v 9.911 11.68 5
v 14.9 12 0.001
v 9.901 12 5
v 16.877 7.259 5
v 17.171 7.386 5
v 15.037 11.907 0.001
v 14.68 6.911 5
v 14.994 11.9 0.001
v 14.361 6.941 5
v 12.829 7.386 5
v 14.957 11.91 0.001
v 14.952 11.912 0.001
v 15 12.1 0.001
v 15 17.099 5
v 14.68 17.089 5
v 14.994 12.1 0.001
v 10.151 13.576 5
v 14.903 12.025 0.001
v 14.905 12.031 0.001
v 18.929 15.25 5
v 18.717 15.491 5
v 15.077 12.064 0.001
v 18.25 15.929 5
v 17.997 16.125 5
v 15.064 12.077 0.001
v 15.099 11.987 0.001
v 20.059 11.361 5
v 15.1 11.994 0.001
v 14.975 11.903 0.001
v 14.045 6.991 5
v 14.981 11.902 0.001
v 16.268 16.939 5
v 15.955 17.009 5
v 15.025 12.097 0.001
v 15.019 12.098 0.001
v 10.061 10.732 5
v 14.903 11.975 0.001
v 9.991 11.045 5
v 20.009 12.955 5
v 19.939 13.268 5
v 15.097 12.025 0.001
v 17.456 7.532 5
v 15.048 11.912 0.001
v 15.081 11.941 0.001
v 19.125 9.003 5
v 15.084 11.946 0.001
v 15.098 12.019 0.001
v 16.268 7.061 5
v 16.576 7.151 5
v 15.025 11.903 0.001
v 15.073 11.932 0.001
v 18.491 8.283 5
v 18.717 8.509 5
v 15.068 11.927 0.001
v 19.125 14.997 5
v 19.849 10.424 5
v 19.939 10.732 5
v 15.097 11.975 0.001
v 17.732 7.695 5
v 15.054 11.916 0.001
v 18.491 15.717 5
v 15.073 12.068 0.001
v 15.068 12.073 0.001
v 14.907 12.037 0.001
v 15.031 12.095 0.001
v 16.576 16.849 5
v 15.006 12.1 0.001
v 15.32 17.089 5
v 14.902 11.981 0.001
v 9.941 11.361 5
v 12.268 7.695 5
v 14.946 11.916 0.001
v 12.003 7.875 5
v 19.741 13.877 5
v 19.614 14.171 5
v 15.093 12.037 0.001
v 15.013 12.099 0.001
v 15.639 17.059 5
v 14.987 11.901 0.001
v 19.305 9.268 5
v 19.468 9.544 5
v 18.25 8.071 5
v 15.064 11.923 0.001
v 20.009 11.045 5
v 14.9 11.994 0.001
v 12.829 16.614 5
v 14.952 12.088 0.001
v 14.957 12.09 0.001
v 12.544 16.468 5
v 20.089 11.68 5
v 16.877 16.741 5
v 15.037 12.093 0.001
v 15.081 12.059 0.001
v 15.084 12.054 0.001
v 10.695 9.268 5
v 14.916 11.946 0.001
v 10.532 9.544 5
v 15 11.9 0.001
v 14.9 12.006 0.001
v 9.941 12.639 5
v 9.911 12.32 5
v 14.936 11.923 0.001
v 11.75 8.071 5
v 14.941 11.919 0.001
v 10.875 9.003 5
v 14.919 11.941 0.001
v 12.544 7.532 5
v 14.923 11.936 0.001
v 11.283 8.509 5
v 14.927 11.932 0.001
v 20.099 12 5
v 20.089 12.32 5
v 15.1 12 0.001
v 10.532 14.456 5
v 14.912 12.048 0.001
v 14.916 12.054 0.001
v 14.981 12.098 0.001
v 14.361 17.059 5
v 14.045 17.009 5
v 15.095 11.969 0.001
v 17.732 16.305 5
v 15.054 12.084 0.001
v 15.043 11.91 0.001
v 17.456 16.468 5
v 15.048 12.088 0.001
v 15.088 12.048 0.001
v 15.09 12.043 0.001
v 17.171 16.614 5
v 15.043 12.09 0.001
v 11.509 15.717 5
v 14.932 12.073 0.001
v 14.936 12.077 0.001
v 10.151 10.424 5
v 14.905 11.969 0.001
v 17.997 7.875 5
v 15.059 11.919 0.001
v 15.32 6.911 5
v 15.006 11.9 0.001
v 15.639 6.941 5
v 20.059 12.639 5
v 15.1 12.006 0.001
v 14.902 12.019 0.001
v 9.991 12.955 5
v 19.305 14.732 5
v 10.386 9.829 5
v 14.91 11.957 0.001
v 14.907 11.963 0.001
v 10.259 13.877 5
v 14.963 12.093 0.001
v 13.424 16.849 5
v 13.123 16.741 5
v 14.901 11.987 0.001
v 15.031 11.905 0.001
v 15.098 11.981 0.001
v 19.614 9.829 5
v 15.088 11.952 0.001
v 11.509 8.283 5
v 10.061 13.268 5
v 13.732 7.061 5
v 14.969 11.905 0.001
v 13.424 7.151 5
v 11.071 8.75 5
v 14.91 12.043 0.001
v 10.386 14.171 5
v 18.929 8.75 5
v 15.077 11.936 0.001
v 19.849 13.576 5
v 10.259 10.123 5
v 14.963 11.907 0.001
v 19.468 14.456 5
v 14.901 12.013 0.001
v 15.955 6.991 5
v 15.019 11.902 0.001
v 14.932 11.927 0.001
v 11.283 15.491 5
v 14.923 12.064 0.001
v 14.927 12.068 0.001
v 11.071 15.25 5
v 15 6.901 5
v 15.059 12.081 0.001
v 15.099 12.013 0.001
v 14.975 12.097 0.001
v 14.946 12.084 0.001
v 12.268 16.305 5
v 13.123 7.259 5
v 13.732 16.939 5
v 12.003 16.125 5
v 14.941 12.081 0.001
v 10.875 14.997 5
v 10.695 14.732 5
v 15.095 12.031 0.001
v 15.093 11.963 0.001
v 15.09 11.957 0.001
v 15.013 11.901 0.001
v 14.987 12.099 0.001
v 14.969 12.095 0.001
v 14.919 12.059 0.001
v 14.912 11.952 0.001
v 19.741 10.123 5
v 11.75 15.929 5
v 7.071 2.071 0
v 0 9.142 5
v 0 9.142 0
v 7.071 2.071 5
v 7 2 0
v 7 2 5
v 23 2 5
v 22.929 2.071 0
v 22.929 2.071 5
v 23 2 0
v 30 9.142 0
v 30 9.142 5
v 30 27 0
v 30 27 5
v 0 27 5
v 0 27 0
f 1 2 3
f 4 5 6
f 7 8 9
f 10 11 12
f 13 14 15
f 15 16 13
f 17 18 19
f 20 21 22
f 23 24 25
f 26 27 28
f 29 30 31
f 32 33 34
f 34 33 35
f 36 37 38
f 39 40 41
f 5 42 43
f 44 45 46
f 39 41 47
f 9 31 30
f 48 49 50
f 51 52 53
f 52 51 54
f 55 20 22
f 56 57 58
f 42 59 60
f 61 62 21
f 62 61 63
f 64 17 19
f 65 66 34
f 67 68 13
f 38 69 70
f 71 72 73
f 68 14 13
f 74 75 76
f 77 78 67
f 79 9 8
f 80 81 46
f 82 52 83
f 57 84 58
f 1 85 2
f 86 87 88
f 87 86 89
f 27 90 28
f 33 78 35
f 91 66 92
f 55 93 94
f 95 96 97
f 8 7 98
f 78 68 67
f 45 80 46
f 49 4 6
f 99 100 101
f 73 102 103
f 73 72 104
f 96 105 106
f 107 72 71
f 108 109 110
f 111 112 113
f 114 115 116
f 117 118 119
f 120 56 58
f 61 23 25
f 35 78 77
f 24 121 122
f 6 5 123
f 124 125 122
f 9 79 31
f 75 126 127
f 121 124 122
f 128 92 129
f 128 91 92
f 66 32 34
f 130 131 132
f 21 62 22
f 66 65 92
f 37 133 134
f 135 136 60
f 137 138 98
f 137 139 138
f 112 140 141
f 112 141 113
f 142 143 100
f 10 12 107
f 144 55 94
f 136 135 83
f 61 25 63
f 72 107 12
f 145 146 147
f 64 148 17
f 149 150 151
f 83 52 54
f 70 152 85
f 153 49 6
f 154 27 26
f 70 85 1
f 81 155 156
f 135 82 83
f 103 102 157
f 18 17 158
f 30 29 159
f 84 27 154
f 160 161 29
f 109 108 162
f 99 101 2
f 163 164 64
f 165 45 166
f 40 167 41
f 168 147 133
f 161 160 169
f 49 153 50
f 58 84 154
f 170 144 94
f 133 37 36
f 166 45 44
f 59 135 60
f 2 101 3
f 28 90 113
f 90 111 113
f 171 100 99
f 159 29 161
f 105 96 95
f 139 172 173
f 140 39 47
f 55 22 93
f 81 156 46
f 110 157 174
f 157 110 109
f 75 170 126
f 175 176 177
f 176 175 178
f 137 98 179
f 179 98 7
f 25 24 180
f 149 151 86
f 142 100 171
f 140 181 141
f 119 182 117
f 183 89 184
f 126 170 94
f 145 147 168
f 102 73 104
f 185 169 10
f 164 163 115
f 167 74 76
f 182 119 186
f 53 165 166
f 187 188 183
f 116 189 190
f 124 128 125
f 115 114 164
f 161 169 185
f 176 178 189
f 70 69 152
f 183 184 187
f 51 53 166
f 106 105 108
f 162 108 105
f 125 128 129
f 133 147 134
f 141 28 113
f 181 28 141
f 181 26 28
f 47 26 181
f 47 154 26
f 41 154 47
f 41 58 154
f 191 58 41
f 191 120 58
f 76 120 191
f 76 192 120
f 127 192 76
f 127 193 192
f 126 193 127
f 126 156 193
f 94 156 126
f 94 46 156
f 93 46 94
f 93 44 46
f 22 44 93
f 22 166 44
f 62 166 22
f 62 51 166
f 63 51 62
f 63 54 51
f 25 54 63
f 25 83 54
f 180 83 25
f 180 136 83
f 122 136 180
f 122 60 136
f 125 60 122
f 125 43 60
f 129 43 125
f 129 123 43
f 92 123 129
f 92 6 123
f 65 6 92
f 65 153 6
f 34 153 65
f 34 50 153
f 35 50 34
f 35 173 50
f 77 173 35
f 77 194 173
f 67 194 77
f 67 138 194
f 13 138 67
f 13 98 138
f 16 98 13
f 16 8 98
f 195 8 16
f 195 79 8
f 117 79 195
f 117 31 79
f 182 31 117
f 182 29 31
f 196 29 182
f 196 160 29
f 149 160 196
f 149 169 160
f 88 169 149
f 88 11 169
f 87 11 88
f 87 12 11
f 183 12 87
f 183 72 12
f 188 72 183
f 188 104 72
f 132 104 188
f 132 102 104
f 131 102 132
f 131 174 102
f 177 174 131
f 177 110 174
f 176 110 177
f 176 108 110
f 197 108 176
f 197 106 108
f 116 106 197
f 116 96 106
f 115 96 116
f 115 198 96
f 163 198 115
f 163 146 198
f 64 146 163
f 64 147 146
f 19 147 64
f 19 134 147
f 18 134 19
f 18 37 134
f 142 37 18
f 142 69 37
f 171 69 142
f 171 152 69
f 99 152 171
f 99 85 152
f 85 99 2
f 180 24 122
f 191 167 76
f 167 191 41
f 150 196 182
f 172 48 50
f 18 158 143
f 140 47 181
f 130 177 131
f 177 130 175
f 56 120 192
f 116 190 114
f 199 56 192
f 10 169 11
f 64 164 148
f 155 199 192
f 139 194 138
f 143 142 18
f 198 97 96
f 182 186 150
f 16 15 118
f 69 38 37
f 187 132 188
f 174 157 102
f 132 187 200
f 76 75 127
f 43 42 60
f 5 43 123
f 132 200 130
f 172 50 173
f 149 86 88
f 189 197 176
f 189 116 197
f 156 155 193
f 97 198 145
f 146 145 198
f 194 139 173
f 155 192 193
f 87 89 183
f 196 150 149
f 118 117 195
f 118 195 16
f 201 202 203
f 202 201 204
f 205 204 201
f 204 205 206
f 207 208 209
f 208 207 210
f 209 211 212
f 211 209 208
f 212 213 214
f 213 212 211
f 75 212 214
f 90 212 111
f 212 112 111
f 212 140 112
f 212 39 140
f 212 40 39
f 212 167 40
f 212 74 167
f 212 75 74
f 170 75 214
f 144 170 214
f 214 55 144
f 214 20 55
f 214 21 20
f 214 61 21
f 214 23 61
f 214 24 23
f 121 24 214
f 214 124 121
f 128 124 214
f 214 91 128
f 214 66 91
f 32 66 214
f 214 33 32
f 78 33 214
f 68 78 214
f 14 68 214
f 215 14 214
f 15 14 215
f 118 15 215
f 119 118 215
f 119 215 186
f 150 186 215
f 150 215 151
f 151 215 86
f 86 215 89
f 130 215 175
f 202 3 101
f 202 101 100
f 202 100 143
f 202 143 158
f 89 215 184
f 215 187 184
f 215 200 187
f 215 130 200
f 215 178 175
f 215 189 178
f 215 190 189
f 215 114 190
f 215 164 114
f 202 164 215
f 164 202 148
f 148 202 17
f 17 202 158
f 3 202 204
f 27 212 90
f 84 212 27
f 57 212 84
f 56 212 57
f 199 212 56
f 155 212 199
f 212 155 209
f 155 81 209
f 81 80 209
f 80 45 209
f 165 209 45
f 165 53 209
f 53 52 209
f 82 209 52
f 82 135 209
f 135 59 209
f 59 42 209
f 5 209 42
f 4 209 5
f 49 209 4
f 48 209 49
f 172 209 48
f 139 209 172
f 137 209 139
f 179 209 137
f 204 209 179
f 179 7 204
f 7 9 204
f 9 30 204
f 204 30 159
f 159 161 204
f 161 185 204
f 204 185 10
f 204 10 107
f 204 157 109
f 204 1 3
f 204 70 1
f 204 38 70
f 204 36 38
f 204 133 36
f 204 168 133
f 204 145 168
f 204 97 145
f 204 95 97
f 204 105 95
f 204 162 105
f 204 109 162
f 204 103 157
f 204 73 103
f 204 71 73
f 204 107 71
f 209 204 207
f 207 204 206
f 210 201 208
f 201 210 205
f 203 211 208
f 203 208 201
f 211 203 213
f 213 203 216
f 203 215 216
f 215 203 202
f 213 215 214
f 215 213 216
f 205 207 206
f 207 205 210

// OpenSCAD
difference(){
	union(){ 

        translate([0,2,0]){
           cube([30,25,5], center=false);
        }                
	}
	union() {
        translate([15,27-15,0.001]){
            rotate([0,0,90]){
                cylinder(h=5, r1=0.1, r2=5.1, $fn=100, center=false);
            }   
        }
        translate([0,-5,-1]){
            rotate([0,0,45]){
                cube([10,10,15], center=false);
            }
        }                
        translate([30,-5,-1]){
            rotate([0,0,45]){
                cube([10,10,15], center=false);
            }
        }                

	}
}
